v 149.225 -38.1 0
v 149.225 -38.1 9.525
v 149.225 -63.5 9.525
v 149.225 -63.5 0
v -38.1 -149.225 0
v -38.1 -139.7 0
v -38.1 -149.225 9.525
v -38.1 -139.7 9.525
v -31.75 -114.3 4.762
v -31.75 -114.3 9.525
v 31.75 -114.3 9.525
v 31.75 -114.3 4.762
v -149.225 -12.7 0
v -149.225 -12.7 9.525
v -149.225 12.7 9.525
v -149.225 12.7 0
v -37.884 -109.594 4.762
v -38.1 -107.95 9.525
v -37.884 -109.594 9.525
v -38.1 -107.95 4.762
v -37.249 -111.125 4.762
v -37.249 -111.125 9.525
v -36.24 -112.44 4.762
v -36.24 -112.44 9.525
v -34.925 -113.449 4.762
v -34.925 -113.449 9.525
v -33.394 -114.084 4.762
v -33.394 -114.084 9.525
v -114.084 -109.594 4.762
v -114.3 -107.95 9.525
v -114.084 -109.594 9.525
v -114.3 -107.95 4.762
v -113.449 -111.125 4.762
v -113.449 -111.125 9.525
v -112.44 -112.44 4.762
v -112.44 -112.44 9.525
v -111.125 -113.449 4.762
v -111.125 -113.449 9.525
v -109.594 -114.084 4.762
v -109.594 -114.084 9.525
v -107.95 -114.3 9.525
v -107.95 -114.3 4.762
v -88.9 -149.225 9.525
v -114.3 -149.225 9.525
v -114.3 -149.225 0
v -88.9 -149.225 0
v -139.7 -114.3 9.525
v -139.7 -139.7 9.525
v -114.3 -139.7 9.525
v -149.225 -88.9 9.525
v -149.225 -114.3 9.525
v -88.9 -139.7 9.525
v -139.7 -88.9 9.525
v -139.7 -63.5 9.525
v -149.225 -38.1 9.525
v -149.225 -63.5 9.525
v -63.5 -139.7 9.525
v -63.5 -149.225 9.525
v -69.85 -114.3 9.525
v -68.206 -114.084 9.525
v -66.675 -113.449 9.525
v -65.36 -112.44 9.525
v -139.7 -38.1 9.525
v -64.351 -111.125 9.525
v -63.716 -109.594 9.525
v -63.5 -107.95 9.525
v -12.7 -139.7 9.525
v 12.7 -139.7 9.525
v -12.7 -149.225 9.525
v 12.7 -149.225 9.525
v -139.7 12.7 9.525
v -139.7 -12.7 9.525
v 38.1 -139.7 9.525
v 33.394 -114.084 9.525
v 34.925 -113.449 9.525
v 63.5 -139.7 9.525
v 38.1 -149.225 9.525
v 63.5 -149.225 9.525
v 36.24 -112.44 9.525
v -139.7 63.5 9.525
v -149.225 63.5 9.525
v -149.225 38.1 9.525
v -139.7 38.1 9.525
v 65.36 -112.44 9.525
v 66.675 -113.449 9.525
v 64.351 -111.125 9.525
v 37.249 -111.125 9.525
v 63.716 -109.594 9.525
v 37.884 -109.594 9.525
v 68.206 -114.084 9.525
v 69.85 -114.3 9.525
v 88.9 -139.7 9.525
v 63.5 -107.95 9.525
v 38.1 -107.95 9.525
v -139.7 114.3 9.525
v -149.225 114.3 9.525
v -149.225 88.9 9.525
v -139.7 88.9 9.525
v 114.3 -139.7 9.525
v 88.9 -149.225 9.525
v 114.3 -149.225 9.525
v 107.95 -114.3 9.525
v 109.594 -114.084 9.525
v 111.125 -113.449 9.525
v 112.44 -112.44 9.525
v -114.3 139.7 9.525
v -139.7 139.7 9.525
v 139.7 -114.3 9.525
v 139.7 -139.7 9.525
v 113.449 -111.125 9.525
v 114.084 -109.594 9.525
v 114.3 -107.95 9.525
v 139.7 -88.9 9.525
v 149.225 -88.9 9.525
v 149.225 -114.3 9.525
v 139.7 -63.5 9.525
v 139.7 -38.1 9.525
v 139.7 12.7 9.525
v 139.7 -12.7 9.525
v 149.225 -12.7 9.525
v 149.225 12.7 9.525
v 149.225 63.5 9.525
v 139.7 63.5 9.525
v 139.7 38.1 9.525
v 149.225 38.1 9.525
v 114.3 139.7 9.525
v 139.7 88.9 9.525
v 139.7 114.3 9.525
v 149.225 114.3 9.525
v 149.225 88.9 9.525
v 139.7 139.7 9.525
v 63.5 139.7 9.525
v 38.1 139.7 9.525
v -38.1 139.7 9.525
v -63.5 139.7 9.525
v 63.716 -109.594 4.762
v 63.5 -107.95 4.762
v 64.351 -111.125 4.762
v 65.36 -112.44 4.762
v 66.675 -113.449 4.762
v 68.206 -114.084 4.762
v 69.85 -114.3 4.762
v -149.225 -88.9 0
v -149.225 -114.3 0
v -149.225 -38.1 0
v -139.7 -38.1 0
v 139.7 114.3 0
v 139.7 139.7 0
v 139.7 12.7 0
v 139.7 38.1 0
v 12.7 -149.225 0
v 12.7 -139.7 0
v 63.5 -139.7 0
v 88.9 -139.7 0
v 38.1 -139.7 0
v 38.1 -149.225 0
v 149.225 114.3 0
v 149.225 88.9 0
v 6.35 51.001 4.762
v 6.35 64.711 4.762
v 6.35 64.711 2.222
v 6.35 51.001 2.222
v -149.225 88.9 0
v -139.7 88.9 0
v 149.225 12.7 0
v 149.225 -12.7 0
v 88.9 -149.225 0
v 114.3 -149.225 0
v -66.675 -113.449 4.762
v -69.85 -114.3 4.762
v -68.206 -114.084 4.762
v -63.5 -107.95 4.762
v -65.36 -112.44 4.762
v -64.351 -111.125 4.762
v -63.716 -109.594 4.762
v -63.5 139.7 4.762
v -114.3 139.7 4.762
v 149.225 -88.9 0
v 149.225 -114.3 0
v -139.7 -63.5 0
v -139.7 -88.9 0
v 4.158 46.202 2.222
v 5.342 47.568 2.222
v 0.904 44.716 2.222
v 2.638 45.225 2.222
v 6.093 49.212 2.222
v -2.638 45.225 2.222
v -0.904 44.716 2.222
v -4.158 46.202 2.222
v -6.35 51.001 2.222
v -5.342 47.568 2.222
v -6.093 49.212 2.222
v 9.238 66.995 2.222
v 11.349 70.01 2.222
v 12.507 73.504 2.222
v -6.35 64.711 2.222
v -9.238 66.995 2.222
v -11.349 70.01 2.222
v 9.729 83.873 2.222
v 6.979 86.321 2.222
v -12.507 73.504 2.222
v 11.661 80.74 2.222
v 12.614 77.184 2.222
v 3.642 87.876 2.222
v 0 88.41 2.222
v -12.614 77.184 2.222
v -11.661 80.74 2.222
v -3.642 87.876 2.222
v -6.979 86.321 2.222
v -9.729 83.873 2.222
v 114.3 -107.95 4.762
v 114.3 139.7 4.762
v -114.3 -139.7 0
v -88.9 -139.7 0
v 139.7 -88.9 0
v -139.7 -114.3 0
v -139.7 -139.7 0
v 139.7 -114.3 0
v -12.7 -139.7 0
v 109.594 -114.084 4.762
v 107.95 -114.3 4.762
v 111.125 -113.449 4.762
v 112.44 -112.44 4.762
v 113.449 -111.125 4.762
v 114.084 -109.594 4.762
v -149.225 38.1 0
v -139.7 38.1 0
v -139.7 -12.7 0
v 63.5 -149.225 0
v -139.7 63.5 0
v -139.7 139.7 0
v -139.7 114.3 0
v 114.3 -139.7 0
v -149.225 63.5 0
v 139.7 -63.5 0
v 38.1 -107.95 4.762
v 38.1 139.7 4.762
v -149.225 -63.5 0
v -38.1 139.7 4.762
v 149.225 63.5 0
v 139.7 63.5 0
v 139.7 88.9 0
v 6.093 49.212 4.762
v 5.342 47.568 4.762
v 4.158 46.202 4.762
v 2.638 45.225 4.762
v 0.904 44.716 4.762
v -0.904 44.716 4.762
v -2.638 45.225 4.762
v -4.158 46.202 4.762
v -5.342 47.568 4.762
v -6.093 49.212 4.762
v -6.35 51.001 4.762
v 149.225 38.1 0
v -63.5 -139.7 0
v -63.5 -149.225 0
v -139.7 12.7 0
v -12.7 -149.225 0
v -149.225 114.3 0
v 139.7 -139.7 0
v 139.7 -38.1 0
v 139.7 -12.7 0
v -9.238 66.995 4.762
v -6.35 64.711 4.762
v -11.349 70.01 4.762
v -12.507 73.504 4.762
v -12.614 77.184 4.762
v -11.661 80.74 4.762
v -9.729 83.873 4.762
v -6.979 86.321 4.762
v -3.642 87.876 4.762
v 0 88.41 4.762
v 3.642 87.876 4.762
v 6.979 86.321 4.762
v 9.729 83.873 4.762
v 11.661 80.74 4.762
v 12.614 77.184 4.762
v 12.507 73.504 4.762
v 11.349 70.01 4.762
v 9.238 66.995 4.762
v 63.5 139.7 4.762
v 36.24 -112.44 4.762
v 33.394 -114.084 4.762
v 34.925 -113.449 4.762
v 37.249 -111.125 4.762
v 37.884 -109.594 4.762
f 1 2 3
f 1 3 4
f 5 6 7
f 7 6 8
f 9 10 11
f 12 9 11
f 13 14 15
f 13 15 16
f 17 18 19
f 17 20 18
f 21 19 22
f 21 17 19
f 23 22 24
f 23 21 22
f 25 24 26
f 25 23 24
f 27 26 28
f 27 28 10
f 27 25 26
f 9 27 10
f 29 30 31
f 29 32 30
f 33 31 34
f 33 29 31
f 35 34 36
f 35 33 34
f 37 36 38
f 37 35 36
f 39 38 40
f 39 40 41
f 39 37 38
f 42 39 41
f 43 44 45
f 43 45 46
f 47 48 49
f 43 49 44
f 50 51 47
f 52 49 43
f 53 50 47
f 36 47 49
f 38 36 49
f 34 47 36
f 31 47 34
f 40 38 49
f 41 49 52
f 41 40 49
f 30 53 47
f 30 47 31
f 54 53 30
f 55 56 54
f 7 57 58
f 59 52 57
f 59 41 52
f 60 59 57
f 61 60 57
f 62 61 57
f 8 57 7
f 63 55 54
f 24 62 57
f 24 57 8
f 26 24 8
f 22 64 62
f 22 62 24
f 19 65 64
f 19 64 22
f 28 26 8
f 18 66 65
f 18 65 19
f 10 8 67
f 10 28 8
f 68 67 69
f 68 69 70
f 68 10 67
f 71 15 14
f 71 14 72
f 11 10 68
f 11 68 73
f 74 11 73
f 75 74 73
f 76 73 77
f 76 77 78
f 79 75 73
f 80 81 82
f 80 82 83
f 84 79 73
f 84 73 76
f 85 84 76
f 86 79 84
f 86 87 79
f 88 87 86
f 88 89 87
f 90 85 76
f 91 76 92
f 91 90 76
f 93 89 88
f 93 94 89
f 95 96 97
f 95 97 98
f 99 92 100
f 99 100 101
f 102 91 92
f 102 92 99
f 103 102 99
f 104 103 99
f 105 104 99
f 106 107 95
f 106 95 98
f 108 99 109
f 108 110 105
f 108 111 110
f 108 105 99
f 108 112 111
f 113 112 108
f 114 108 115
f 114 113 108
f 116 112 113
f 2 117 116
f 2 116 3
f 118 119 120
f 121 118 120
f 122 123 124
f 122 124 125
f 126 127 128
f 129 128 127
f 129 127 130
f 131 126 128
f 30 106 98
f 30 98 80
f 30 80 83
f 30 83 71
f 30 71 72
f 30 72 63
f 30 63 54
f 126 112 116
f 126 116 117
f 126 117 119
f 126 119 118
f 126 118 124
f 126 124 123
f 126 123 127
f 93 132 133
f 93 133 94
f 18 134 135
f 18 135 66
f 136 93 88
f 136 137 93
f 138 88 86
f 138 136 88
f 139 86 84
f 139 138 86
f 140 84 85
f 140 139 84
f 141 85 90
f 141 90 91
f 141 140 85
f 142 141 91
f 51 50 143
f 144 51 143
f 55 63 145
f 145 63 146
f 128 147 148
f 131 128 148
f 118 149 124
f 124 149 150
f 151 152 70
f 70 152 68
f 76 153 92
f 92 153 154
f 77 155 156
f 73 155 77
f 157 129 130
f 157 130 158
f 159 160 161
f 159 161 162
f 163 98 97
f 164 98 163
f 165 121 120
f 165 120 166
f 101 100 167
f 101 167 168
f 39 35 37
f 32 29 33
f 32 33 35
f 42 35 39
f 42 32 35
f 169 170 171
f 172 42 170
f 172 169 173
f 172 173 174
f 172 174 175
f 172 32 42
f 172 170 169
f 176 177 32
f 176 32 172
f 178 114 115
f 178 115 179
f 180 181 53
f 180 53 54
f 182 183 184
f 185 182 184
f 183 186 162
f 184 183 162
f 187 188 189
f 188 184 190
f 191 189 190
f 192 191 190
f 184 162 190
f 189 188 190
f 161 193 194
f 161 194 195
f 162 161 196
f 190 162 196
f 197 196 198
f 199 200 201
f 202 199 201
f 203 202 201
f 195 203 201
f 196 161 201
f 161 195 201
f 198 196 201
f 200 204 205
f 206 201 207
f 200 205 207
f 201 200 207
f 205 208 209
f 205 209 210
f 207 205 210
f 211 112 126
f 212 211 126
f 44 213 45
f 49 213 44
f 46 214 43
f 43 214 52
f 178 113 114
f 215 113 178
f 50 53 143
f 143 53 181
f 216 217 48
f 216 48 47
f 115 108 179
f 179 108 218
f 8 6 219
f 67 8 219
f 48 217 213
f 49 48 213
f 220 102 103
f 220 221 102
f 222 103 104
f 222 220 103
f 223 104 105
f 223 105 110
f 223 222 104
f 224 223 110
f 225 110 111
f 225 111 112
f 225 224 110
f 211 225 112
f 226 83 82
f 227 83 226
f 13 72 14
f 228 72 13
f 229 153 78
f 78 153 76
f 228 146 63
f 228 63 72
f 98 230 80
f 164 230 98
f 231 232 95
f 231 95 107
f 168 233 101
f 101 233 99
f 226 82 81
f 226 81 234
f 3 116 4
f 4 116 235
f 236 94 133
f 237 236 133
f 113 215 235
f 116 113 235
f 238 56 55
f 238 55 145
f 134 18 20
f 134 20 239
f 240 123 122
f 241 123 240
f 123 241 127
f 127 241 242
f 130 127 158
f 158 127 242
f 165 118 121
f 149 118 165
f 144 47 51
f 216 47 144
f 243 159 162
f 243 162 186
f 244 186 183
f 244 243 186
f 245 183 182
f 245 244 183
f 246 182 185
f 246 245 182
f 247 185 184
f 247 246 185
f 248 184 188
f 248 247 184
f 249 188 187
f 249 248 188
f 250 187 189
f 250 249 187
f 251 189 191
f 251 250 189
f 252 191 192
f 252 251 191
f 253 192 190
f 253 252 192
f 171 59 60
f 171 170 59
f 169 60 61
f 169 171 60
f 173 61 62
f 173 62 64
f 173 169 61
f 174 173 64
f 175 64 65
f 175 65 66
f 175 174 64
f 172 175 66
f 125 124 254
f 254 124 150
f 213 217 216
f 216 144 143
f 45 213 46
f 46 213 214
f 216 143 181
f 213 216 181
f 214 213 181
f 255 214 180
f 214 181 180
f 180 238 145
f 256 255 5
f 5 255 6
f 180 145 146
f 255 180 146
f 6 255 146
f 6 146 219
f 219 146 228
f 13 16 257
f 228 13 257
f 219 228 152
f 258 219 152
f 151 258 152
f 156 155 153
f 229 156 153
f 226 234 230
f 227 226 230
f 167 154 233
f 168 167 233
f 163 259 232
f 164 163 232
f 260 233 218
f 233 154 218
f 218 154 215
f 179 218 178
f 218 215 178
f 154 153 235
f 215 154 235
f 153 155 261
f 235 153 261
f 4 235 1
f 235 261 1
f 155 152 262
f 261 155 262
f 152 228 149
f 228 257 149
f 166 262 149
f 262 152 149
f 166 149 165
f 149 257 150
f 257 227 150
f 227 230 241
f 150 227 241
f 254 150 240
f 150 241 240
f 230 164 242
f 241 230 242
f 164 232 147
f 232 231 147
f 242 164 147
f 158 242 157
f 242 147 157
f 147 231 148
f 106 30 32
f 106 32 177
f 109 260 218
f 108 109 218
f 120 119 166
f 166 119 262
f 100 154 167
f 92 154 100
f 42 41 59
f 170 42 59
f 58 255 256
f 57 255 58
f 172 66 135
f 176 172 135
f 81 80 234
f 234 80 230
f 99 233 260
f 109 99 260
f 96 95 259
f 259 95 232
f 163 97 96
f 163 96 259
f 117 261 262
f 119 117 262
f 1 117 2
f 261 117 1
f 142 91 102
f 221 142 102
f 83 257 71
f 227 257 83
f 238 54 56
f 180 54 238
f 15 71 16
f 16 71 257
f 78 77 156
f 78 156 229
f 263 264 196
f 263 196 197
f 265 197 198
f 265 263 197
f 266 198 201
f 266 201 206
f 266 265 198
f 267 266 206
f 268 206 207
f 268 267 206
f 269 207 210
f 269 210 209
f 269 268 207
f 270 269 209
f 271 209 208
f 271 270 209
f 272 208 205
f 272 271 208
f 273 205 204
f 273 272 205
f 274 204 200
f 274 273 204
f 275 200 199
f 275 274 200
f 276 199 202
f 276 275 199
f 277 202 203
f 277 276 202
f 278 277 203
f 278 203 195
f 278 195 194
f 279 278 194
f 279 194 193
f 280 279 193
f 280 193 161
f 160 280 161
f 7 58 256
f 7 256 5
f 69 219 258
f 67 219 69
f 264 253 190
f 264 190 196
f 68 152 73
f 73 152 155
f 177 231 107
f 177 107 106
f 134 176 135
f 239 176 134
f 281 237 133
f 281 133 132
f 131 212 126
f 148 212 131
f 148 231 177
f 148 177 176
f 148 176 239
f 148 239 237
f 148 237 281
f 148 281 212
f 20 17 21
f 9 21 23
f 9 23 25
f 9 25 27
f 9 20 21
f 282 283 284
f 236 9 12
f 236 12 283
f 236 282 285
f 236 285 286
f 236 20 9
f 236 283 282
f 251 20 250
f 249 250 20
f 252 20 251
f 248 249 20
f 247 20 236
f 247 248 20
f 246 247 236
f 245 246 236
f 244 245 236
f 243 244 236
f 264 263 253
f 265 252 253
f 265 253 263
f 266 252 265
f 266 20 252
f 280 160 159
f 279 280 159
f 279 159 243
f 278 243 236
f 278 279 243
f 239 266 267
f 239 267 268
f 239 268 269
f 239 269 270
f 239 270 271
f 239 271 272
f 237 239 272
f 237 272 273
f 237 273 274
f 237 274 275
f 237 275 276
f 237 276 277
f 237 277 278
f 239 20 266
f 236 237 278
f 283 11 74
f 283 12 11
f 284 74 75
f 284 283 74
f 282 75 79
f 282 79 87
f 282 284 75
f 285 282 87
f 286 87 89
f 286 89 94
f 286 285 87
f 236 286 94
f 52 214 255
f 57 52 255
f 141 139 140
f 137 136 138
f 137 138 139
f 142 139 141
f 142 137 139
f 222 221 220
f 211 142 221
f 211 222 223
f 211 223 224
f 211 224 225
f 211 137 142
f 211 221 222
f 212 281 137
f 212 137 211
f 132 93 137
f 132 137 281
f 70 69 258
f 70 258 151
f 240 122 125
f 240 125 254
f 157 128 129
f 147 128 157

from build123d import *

# Parameters (mm, degrees)
SKETCH2_W               = 279.4
SKETCH2_H               = 279.4
BOSS_EXTRUDE1_DEPTH     = 9.525
SKETCH4_W               = 9.525
SKETCH4_H               = 25.4
BOSS_EXTRUDE3_DEPTH     = 9.525
LPATTERN2_COUNT         = 5
LPATTERN2_PITCH         = 50.8
MIRROR2_COPY_1_SKETCH_W = 9.525
MIRROR2_COPY_1_SKETCH_H = 25.4
MIRROR2_COPY_1_DEPTH    = 9.525
MIRROR2_COPY_2_SKETCH_W = 9.525
MIRROR2_COPY_2_SKETCH_H = 25.4
MIRROR2_COPY_2_DEPTH    = 9.525
MIRROR2_COPY_3_SKETCH_W = 9.525
MIRROR2_COPY_3_SKETCH_H = 25.4
MIRROR2_COPY_3_DEPTH    = 9.525
MIRROR2_COPY_4_SKETCH_W = 9.525
MIRROR2_COPY_4_SKETCH_H = 25.4
MIRROR2_COPY_4_DEPTH    = 9.525
SKETCH5_W               = 25.4
SKETCH5_H               = 9.525
BOSS_EXTRUDE4_DEPTH     = 9.525
LPATTERN3_COUNT         = 5
LPATTERN3_PITCH         = 50.8
SKETCH6_W               = 76.2
SKETCH6_H               = 254
SKETCH6_W_2             = 50.8
CUT_EXTRUDE1_DEPTH      = 4.7625
FILLET1_R               = 6.35
CUT_EXTRUDE2_DEPTH      = 2.54


with BuildPart() as part:
    # Sketch2 → Boss-Extrude1 (new body)
    with BuildSketch(Plane.XY):
        Rectangle(SKETCH2_W, SKETCH2_H)
    extrude(amount=BOSS_EXTRUDE1_DEPTH)

    # Sketch4 → Boss-Extrude3 (add)
    with BuildSketch(Plane(origin=(139.7, 0, 0), x_dir=(0, 0, -1), z_dir=(1, 0, 0))):
        with Locations((-4.7625, -101.6)):
            Rectangle(SKETCH4_W, SKETCH4_H)
    boss_extrude3 = extrude(amount=BOSS_EXTRUDE3_DEPTH)

    # LPattern2: Boss-Extrude3 ×5
    with Locations(*[(0, i * LPATTERN2_PITCH, 0) for i in range(1, LPATTERN2_COUNT)]):
        add(boss_extrude3)

    # Mirror2: Boss-Extrude3 across plane
    add(boss_extrude3.mirror(Plane(origin=(0, 0, 0), x_dir=(0, 0, 1), z_dir=(1, 0, 0))))

    # Mirror2 copy 1 sketch → Mirror2 copy 1 (add)
    with BuildSketch(Plane(origin=(-139.7, 50.8, 0), x_dir=(0, 0, -1), z_dir=(-1, 0, 0))):
        with Locations((-4.7625, 101.6)):
            Rectangle(MIRROR2_COPY_1_SKETCH_W, MIRROR2_COPY_1_SKETCH_H)
    extrude(amount=MIRROR2_COPY_1_DEPTH)

    # Mirror2 copy 2 sketch → Mirror2 copy 2 (add)
    with BuildSketch(Plane(origin=(-139.7, 101.6, 0), x_dir=(0, 0, -1), z_dir=(-1, 0, 0))):
        with Locations((-4.7625, 101.6)):
            Rectangle(MIRROR2_COPY_2_SKETCH_W, MIRROR2_COPY_2_SKETCH_H)
    extrude(amount=MIRROR2_COPY_2_DEPTH)

    # Mirror2 copy 3 sketch → Mirror2 copy 3 (add)
    with BuildSketch(Plane(origin=(-139.7, 152.4, 0), x_dir=(0, 0, -1), z_dir=(-1, 0, 0))):
        with Locations((-4.7625, 101.6)):
            Rectangle(MIRROR2_COPY_3_SKETCH_W, MIRROR2_COPY_3_SKETCH_H)
    extrude(amount=MIRROR2_COPY_3_DEPTH)

    # Mirror2 copy 4 sketch → Mirror2 copy 4 (add)
    with BuildSketch(Plane(origin=(-139.7, 203.2, 0), x_dir=(0, 0, -1), z_dir=(-1, 0, 0))):
        with Locations((-4.7625, 101.6)):
            Rectangle(MIRROR2_COPY_4_SKETCH_W, MIRROR2_COPY_4_SKETCH_H)
    extrude(amount=MIRROR2_COPY_4_DEPTH)

    # Sketch5 → Boss-Extrude4 (add)
    with BuildSketch(Plane.XZ.offset(139.7)):
        with Locations((-101.6, 4.7625)):
            Rectangle(SKETCH5_W, SKETCH5_H)
    boss_extrude4 = extrude(amount=BOSS_EXTRUDE4_DEPTH)

    # LPattern3: Boss-Extrude4 ×5
    with Locations(*[(i * LPATTERN3_PITCH, 0, 0) for i in range(1, LPATTERN3_COUNT)]):
        add(boss_extrude4)

    # Sketch6 → Cut-Extrude1 (cut)
    with BuildSketch(Plane.XY.offset(9.525)):
        with Locations((0, 12.7)):
            Rectangle(SKETCH6_W, SKETCH6_H)
        with Locations((-88.9, 12.7)):
            Rectangle(SKETCH6_W_2, SKETCH6_H)
        with Locations((88.9, 12.7)):
            Rectangle(SKETCH6_W_2, SKETCH6_H)
    extrude(amount=-CUT_EXTRUDE1_DEPTH, mode=Mode.SUBTRACT)

    # Fillet1
    fillet1_edges = [part.edges().sort_by_distance(p)[0] for p in [
        (63.5, -114.3, 7.14375),
        (114.3, -114.3, 7.14375),
        (-114.3, -114.3, 7.14375),
        (-63.5, -114.3, 7.14375),
        (-38.1, -114.3, 7.14375),
        (38.1, -114.3, 7.14375),
    ]]
    fillet(fillet1_edges, radius=FILLET1_R)

    # Sketch7 → Cut-Extrude2 (cut)
    with BuildSketch(Plane.XY.offset(4.7625)):
        with BuildLine():
            Line((6.35, 64.711297153), (6.35, 51.001361114))
            ThreePointArc((6.35, 51.001361114), (0, 44.651361114), (-6.35, 51.001361114))
            Line((-6.35, 51.001361114), (-6.35, 64.711297153))
            ThreePointArc((-6.35, 64.711297153), (0, 88.409819781), (6.35, 64.711297153))
        make_face()
    extrude(amount=-CUT_EXTRUDE2_DEPTH, mode=Mode.SUBTRACT)


solid = part.part
